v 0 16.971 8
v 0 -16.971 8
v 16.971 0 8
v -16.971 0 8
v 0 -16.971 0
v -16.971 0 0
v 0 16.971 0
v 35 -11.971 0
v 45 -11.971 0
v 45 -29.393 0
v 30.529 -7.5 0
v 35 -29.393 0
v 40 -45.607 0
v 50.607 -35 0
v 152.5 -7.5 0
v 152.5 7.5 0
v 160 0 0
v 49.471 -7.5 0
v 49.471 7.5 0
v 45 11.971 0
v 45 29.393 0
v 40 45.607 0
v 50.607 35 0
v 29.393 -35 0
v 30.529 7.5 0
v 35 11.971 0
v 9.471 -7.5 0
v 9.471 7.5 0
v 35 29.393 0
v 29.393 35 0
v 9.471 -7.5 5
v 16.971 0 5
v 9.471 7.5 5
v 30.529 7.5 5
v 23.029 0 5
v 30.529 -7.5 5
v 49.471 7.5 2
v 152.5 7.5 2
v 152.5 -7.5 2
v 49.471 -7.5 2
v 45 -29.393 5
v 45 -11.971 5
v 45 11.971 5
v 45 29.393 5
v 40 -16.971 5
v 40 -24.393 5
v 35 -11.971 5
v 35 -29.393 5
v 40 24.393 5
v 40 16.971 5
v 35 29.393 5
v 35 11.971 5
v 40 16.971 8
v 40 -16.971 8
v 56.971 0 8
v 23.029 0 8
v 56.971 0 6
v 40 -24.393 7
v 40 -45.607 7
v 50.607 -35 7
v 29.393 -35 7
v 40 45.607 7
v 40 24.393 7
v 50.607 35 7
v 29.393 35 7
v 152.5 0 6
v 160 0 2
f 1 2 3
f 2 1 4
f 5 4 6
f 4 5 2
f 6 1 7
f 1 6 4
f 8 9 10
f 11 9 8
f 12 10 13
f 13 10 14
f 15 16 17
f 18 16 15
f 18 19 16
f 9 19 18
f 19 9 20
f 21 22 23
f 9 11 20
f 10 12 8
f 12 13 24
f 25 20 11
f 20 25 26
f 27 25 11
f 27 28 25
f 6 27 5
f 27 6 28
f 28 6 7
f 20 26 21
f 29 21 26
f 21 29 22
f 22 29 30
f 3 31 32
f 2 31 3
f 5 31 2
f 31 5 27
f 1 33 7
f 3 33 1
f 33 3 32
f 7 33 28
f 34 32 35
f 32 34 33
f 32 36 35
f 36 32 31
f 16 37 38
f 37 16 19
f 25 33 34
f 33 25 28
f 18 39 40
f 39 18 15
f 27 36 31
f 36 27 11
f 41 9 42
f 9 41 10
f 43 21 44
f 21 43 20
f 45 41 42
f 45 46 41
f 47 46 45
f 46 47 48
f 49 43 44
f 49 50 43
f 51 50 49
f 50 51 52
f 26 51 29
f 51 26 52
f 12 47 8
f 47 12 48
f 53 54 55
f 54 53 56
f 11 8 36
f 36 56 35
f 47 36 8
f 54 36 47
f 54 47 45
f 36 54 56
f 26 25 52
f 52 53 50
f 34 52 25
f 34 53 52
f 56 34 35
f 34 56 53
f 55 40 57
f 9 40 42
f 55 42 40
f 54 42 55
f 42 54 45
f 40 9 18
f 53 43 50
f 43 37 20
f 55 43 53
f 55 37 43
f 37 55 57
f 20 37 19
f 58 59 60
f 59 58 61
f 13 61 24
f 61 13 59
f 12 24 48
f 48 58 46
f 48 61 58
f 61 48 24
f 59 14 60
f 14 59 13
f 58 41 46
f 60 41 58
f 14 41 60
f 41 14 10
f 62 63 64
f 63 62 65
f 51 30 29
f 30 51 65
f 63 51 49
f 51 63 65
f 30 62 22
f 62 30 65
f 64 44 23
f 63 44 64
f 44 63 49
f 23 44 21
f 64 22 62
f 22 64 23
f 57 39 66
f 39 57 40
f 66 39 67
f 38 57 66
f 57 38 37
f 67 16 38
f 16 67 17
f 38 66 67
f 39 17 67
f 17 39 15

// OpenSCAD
// [FL_INDEX: keywords="openscad, 3d_parametric, Customizable_Sword, csg_solid" | COT="Parametric OpenSCAD design from 3DCodeverse"]
// Title: Customizable Sword

large_decoration_height = 8; //[0:30]
small_decoration_height = 7; //[0:30]
large_decoration_width = 24; //[10:40]
small_decoration_width = 15; //[7:35]
handle_width = 15; //[5:25]
hilt_width = 10; //[5:25]
hilt_length = 70; //[30:130]
handle_height = 5; //[0:30]
blade_length = 120; //[20:250]
blade_side_height = 2; //[0:30]
blade_center_height = 6; //[0:30]

// preview[view:south west, tilt:top diagonal]

//bottom
	rotate([0,0,45])
	translate([-large_decoration_width/2,-large_decoration_width/2,0])
	cube(size=[large_decoration_width,large_decoration_width,large_decoration_height]);

//handle
translate([0,-handle_width/2,0])
cube(size = [40,handle_width,handle_height]);

//hilt
translate([40 - hilt_width/2,-hilt_length/2,0])
cube(size = [hilt_width,hilt_length,handle_height]);

//where the two parts of the handle intersect
translate([40,0,0])
	rotate([0,0,45])
	translate([-large_decoration_width/2,-large_decoration_width/2,0])
	cube(size=[large_decoration_width,large_decoration_width,large_decoration_height]);

//right of hilt
translate([40,-hilt_length/2,0])
	rotate([0,0,45])
	translate([-small_decoration_width/2,-small_decoration_width/2,0])
	cube(size=[small_decoration_width,small_decoration_width,small_decoration_height]);

//left of hilt
translate([40,hilt_length/2,0])
	rotate([0,0,45])
	translate([-small_decoration_width/2,-small_decoration_width/2,0])
	cube(size=[small_decoration_width,small_decoration_width,small_decoration_height]);

//blade
translate([40,0,0])
polyhedron(
	points=[
			//bottom
			[0,-7.5,0], //0
			[blade_length-7.5,-7.5,0], //1
			[blade_length-7.5,7.5,0], //2
			[0,7.5,0], //3
			[blade_length,0,0], //4
			//middle
			[0,-7.5,blade_side_height], //5
			[blade_length-7.5,-7.5,blade_side_height], //6
			[blade_length-7.5,7.5,blade_side_height], //7
			[0,7.5,blade_side_height], //8
			[blade_length,0,blade_side_height], //9
			//top
			[0,0,blade_center_height], //10
			[blade_length-7.5,0,blade_center_height] //11
			],
	triangles=[
			//~-~bottom~-~
			[0,1,2],
			[0,2,3],
			//bottom point
			[1,4,2],
			//~-~walls~-~
			//right
			[0,5,1],
			[5,6,1],
			//right point
			[1,6,4],
			[4,6,9],
			//left
			[8,3,2],
			[7,8,2],
			//left point
			[7,2,4],
			[7,4,9],
			//back
			[0,3,5],
			[5,3,8],
			//~-~top~-~
			//right
			[10,6,5],
			[11,6,10],
			//right point
			[11,9,6],
			//left
			[10,8,7],
			[7,11,10],
			//left point
			[11,7,9],
			//back
			[10,5,8]
			]
	
);
